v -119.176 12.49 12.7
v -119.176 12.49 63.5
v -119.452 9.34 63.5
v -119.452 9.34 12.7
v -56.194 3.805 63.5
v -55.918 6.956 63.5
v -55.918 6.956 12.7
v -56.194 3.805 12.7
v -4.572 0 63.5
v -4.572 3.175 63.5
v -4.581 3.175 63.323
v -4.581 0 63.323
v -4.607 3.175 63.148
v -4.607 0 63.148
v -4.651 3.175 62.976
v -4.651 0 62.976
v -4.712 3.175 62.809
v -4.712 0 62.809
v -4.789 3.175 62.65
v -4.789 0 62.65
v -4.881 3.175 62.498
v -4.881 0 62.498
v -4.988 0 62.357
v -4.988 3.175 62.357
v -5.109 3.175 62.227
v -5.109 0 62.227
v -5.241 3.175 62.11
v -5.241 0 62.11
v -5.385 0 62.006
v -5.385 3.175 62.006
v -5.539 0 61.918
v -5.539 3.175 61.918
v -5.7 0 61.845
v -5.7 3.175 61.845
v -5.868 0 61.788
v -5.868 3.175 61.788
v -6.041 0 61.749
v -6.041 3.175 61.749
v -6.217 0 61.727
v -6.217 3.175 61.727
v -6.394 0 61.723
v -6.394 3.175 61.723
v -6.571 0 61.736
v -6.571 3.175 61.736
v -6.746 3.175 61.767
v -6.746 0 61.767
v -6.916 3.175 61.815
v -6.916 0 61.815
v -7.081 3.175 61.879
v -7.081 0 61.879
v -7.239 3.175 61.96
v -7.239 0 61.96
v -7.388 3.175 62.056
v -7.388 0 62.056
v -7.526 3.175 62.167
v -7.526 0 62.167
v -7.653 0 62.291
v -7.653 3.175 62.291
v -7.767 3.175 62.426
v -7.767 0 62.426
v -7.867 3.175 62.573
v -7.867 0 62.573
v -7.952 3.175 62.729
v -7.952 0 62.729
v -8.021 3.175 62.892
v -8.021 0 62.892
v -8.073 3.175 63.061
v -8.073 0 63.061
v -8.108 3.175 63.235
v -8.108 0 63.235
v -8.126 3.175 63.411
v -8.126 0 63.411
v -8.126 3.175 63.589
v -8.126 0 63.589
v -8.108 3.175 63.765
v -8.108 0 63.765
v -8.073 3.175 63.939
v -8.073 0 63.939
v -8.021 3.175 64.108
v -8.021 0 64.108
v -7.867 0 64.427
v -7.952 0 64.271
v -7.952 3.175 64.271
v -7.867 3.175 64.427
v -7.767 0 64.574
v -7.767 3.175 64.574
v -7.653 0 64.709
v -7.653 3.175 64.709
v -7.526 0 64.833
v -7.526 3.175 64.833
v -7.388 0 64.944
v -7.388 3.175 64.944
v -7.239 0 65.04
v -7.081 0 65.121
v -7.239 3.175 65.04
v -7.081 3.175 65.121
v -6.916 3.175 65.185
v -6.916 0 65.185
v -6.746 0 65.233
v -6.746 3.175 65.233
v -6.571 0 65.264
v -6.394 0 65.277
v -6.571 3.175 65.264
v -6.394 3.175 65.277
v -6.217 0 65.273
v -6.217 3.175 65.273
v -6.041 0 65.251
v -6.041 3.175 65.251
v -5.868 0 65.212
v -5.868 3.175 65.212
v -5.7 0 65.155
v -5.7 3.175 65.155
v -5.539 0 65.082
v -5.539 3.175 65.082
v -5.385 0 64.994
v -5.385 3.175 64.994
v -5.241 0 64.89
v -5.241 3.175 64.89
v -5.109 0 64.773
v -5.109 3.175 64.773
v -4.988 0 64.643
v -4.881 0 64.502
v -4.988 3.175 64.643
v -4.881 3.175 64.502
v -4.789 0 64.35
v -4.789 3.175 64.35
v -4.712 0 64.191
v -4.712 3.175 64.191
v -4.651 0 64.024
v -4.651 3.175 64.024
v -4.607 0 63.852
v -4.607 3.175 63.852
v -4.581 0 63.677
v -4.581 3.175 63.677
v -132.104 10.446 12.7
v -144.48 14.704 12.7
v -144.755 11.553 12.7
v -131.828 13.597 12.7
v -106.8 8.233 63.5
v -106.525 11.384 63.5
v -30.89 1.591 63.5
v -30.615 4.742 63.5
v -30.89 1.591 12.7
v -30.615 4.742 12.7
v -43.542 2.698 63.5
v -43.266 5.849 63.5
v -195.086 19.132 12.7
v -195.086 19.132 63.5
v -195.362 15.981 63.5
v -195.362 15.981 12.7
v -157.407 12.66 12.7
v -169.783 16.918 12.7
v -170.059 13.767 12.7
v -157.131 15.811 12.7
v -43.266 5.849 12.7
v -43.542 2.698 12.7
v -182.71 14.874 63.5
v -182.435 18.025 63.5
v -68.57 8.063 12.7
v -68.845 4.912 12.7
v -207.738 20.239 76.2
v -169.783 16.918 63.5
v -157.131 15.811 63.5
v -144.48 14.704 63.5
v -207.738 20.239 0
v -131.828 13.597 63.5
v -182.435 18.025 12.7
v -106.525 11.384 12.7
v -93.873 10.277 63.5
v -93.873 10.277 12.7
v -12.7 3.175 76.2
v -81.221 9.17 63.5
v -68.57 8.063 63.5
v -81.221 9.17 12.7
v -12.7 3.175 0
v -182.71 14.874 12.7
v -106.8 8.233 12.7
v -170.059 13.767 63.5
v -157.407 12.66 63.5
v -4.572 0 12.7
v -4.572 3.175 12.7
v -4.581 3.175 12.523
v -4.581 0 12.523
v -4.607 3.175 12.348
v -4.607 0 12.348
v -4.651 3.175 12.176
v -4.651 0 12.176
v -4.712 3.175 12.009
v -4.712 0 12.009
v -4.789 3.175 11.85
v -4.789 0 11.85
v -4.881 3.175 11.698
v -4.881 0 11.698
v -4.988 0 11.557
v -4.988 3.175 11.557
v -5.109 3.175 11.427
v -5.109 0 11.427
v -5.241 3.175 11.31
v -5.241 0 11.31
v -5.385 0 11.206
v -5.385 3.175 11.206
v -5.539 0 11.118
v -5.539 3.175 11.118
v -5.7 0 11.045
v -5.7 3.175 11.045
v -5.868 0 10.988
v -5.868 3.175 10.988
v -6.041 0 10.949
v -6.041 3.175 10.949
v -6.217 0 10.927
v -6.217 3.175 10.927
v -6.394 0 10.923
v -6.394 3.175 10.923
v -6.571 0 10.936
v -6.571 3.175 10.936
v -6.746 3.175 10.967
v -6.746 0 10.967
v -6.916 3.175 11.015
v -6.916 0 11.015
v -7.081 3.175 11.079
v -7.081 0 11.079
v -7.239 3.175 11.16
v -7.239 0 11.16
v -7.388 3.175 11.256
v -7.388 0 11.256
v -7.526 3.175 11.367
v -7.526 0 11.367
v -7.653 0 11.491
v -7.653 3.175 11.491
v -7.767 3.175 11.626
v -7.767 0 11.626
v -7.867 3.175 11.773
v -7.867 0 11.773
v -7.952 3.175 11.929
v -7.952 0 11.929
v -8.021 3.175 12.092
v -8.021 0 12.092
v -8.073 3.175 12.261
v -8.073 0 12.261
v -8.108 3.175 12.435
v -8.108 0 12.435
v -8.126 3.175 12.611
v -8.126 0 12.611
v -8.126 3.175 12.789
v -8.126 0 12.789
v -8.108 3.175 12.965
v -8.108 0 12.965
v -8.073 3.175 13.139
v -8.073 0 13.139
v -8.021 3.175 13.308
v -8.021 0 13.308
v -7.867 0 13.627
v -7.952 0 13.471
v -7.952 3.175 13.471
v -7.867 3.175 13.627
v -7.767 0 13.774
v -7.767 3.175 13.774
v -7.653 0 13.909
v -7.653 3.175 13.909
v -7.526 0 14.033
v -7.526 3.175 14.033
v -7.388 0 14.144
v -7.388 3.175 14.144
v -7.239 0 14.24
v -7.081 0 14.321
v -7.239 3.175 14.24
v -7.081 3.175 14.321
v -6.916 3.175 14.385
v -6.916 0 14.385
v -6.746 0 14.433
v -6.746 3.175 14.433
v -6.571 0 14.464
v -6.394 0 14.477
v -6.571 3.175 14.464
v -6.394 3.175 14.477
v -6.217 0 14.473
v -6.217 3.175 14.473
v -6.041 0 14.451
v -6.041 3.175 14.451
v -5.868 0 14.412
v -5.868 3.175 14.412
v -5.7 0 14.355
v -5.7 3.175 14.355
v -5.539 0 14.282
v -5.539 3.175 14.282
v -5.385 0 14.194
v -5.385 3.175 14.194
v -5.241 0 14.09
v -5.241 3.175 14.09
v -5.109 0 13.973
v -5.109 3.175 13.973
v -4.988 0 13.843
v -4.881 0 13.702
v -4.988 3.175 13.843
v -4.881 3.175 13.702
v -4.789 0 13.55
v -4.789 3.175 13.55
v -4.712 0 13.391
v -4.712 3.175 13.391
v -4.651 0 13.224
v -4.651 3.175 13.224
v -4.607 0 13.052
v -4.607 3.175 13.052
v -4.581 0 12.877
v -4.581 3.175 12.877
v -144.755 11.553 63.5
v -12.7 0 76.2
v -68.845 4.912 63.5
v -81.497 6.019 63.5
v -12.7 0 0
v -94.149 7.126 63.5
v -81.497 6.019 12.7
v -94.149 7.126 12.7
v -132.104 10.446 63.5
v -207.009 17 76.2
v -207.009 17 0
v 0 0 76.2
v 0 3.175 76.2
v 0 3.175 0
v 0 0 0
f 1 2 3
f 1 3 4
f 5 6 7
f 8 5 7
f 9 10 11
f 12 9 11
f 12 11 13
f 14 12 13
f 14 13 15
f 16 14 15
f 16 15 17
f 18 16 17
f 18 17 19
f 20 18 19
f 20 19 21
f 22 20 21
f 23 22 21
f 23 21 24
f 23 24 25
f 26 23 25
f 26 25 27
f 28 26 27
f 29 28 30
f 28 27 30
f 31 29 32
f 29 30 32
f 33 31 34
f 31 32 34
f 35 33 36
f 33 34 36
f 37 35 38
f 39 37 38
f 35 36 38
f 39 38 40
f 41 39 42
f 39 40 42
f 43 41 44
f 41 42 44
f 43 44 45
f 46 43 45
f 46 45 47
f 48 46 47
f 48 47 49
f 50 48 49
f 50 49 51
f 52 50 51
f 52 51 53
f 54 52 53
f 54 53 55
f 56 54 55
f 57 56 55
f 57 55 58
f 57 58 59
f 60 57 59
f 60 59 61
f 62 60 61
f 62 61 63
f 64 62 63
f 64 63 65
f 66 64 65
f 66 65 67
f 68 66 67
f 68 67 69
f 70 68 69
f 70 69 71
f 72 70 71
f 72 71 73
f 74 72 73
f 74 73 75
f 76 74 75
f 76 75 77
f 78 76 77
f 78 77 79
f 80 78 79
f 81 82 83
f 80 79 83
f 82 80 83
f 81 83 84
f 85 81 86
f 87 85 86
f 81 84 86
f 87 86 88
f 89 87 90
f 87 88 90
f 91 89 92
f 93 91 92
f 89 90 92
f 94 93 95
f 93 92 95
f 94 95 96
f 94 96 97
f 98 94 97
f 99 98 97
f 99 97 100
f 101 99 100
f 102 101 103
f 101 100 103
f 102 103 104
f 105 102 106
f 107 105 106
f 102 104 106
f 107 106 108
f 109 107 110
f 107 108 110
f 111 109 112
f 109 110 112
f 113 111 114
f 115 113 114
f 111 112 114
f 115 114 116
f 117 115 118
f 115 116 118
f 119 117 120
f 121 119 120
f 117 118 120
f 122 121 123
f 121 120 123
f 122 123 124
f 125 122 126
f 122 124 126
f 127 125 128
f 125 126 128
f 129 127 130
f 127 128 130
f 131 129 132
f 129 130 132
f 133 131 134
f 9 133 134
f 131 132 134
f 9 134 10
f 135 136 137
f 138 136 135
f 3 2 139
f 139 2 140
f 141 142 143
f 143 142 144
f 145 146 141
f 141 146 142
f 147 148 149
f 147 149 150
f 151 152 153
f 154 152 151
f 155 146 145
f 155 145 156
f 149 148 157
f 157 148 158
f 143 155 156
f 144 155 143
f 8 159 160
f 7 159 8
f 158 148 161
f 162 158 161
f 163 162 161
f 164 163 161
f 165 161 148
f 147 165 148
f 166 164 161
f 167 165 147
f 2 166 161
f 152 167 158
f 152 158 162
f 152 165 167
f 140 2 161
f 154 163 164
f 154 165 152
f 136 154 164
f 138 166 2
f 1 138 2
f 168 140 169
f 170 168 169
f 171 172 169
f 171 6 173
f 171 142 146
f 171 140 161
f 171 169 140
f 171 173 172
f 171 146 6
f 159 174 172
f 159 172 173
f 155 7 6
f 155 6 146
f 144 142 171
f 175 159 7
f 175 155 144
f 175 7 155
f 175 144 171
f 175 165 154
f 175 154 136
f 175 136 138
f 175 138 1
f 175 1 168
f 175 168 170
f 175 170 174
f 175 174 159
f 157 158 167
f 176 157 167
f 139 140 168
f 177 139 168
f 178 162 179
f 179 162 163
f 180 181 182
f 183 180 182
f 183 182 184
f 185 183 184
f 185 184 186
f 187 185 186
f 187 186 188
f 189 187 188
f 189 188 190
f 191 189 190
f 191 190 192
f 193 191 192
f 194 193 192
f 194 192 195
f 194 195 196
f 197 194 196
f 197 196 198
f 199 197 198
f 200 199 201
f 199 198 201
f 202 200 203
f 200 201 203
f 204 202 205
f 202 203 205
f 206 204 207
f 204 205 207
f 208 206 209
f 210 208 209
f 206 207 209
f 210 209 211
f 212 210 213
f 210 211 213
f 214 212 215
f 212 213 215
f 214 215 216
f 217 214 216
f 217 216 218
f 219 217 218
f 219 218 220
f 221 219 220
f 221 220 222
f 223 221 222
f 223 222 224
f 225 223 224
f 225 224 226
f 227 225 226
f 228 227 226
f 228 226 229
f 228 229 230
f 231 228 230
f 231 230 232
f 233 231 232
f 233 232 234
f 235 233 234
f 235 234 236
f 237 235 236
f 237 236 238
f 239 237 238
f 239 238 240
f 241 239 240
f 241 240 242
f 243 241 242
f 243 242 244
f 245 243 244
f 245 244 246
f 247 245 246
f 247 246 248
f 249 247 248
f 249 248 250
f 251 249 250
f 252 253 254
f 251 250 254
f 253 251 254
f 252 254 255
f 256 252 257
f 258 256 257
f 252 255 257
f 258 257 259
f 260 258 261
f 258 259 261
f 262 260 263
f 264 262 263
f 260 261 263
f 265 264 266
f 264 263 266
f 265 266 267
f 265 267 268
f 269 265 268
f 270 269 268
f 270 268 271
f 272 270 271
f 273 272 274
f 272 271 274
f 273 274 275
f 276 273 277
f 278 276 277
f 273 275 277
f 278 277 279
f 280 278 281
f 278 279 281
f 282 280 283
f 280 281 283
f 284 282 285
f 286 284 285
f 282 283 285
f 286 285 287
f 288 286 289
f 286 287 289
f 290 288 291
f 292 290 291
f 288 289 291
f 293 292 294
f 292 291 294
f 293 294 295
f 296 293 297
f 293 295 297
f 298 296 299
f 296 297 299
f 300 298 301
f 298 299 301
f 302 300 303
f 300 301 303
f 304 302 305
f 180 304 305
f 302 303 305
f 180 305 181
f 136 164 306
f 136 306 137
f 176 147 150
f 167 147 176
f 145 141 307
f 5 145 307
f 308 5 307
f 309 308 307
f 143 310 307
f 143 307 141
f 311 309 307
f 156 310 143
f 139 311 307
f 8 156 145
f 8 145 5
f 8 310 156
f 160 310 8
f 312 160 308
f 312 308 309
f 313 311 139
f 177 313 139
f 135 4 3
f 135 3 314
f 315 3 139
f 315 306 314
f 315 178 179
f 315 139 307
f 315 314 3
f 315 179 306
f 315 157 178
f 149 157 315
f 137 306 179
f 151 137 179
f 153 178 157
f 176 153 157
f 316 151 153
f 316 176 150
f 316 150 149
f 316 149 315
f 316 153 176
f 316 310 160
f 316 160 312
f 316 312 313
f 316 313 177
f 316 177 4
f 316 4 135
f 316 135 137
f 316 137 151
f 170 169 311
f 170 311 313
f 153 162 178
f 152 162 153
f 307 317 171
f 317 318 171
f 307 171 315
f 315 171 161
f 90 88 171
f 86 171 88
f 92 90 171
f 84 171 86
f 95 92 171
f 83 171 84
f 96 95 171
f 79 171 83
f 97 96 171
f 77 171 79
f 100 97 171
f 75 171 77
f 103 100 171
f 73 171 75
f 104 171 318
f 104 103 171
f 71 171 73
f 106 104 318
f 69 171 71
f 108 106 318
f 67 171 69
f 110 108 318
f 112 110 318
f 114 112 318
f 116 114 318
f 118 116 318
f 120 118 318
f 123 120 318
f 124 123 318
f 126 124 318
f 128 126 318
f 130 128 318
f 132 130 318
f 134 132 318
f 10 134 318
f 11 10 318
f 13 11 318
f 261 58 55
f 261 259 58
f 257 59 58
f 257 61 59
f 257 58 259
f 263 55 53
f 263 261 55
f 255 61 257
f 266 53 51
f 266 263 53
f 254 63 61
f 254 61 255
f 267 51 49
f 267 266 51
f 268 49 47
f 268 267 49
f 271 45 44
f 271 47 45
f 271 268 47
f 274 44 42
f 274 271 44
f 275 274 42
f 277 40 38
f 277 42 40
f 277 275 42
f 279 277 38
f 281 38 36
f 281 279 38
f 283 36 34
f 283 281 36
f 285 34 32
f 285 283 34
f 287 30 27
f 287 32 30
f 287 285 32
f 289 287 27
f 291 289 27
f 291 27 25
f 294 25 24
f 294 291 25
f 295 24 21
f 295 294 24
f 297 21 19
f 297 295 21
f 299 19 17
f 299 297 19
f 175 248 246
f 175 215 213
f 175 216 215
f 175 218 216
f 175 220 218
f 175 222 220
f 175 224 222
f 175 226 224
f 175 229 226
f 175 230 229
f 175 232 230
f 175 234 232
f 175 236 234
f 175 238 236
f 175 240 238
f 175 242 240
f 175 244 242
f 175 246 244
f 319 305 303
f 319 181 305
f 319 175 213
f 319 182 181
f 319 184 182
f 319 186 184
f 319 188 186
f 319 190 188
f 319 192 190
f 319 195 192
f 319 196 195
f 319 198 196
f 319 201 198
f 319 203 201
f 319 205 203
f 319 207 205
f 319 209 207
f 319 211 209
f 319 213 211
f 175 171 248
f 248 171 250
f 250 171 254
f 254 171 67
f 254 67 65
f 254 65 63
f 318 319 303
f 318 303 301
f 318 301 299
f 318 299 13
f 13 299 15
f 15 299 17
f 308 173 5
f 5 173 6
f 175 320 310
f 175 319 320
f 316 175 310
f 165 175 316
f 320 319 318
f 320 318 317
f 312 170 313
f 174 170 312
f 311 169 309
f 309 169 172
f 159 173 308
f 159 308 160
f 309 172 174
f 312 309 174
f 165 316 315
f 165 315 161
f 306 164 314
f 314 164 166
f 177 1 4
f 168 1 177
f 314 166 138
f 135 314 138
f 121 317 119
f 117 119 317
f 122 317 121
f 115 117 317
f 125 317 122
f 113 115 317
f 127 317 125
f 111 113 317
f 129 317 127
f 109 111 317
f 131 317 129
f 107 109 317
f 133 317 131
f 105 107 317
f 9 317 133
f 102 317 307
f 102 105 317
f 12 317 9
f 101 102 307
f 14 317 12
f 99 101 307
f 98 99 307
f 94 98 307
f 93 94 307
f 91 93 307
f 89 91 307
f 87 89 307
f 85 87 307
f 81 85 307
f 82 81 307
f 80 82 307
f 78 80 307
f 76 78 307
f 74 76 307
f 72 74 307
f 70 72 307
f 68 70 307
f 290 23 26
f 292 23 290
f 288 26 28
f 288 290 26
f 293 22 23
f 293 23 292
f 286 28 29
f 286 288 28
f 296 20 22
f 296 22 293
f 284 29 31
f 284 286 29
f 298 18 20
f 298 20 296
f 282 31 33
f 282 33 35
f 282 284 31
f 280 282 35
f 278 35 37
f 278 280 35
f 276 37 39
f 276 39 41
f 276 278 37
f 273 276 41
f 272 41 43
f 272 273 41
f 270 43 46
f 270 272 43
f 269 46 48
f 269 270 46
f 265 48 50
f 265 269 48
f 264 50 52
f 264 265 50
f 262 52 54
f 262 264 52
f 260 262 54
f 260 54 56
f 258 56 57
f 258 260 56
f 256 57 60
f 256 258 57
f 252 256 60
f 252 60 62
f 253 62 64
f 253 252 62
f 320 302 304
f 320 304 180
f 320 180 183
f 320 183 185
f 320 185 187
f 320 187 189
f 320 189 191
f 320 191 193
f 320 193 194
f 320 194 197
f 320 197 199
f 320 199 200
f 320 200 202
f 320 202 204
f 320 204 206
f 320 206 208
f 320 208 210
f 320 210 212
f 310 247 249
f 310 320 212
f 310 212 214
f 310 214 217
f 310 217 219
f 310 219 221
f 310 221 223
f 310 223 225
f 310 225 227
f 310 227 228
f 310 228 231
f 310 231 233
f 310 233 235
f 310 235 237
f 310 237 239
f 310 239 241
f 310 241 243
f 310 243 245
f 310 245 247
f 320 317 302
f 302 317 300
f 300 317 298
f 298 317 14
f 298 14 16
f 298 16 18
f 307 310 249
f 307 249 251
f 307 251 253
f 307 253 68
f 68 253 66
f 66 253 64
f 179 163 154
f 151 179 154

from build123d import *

# Parameters (mm, degrees)
BOSS_EXTRUDE1_DEPTH = 76.2
SKETCH2_R           = 1.778
CUT_EXTRUDE1_DEPTH  = 76.2
SKETCH3_W           = 12.7
SKETCH3_H           = 50.8
CUT_EXTRUDE2_DEPTH  = 76.2
LPATTERN1_COUNT     = 7
LPATTERN1_PITCH     = 25.4


with BuildPart() as part:
    # Sketch1 → Boss-Extrude1 (new body)
    with BuildSketch(Plane.XY):
        Polygon((0, 0), (-12.7, 0), (-207.009499064, 16.999878384), (-207.737954037, 20.238609936), (-12.7, 3.175), (0, 3.175), align=None)
    extrude(amount=BOSS_EXTRUDE1_DEPTH)

    # Sketch2 → Cut-Extrude1 (cut)
    with BuildSketch(Plane(origin=(0, 3.175, 0), x_dir=(1, 0, 0), z_dir=(0, 1, 0))):
        with Locations((-6.35, -12.7)):
            Circle(SKETCH2_R)
        with Locations((-6.35, -63.5)):
            Circle(SKETCH2_R)
    extrude(amount=-CUT_EXTRUDE1_DEPTH, mode=Mode.SUBTRACT)

    # Sketch3 → Cut-Extrude2 (cut)
    with BuildSketch(Plane(origin=(0.179195714, 2.04821638, 0), x_dir=(0.996194698, -0.087155743, 0), z_dir=(0.087155743, 0.996194698, 0))):
        with Locations((-189.661359485, -38.1)):
            Rectangle(SKETCH3_W, SKETCH3_H)
    cut_extrude2 = extrude(amount=-CUT_EXTRUDE2_DEPTH, mode=Mode.SUBTRACT)

    # LPattern1: Cut-Extrude2 ×7
    with Locations(*[Vector(0.996194698, -0.087155743, 0) * (i * LPATTERN1_PITCH) for i in range(1, LPATTERN1_COUNT)]):
        add(cut_extrude2, mode=Mode.SUBTRACT)


solid = part.part
